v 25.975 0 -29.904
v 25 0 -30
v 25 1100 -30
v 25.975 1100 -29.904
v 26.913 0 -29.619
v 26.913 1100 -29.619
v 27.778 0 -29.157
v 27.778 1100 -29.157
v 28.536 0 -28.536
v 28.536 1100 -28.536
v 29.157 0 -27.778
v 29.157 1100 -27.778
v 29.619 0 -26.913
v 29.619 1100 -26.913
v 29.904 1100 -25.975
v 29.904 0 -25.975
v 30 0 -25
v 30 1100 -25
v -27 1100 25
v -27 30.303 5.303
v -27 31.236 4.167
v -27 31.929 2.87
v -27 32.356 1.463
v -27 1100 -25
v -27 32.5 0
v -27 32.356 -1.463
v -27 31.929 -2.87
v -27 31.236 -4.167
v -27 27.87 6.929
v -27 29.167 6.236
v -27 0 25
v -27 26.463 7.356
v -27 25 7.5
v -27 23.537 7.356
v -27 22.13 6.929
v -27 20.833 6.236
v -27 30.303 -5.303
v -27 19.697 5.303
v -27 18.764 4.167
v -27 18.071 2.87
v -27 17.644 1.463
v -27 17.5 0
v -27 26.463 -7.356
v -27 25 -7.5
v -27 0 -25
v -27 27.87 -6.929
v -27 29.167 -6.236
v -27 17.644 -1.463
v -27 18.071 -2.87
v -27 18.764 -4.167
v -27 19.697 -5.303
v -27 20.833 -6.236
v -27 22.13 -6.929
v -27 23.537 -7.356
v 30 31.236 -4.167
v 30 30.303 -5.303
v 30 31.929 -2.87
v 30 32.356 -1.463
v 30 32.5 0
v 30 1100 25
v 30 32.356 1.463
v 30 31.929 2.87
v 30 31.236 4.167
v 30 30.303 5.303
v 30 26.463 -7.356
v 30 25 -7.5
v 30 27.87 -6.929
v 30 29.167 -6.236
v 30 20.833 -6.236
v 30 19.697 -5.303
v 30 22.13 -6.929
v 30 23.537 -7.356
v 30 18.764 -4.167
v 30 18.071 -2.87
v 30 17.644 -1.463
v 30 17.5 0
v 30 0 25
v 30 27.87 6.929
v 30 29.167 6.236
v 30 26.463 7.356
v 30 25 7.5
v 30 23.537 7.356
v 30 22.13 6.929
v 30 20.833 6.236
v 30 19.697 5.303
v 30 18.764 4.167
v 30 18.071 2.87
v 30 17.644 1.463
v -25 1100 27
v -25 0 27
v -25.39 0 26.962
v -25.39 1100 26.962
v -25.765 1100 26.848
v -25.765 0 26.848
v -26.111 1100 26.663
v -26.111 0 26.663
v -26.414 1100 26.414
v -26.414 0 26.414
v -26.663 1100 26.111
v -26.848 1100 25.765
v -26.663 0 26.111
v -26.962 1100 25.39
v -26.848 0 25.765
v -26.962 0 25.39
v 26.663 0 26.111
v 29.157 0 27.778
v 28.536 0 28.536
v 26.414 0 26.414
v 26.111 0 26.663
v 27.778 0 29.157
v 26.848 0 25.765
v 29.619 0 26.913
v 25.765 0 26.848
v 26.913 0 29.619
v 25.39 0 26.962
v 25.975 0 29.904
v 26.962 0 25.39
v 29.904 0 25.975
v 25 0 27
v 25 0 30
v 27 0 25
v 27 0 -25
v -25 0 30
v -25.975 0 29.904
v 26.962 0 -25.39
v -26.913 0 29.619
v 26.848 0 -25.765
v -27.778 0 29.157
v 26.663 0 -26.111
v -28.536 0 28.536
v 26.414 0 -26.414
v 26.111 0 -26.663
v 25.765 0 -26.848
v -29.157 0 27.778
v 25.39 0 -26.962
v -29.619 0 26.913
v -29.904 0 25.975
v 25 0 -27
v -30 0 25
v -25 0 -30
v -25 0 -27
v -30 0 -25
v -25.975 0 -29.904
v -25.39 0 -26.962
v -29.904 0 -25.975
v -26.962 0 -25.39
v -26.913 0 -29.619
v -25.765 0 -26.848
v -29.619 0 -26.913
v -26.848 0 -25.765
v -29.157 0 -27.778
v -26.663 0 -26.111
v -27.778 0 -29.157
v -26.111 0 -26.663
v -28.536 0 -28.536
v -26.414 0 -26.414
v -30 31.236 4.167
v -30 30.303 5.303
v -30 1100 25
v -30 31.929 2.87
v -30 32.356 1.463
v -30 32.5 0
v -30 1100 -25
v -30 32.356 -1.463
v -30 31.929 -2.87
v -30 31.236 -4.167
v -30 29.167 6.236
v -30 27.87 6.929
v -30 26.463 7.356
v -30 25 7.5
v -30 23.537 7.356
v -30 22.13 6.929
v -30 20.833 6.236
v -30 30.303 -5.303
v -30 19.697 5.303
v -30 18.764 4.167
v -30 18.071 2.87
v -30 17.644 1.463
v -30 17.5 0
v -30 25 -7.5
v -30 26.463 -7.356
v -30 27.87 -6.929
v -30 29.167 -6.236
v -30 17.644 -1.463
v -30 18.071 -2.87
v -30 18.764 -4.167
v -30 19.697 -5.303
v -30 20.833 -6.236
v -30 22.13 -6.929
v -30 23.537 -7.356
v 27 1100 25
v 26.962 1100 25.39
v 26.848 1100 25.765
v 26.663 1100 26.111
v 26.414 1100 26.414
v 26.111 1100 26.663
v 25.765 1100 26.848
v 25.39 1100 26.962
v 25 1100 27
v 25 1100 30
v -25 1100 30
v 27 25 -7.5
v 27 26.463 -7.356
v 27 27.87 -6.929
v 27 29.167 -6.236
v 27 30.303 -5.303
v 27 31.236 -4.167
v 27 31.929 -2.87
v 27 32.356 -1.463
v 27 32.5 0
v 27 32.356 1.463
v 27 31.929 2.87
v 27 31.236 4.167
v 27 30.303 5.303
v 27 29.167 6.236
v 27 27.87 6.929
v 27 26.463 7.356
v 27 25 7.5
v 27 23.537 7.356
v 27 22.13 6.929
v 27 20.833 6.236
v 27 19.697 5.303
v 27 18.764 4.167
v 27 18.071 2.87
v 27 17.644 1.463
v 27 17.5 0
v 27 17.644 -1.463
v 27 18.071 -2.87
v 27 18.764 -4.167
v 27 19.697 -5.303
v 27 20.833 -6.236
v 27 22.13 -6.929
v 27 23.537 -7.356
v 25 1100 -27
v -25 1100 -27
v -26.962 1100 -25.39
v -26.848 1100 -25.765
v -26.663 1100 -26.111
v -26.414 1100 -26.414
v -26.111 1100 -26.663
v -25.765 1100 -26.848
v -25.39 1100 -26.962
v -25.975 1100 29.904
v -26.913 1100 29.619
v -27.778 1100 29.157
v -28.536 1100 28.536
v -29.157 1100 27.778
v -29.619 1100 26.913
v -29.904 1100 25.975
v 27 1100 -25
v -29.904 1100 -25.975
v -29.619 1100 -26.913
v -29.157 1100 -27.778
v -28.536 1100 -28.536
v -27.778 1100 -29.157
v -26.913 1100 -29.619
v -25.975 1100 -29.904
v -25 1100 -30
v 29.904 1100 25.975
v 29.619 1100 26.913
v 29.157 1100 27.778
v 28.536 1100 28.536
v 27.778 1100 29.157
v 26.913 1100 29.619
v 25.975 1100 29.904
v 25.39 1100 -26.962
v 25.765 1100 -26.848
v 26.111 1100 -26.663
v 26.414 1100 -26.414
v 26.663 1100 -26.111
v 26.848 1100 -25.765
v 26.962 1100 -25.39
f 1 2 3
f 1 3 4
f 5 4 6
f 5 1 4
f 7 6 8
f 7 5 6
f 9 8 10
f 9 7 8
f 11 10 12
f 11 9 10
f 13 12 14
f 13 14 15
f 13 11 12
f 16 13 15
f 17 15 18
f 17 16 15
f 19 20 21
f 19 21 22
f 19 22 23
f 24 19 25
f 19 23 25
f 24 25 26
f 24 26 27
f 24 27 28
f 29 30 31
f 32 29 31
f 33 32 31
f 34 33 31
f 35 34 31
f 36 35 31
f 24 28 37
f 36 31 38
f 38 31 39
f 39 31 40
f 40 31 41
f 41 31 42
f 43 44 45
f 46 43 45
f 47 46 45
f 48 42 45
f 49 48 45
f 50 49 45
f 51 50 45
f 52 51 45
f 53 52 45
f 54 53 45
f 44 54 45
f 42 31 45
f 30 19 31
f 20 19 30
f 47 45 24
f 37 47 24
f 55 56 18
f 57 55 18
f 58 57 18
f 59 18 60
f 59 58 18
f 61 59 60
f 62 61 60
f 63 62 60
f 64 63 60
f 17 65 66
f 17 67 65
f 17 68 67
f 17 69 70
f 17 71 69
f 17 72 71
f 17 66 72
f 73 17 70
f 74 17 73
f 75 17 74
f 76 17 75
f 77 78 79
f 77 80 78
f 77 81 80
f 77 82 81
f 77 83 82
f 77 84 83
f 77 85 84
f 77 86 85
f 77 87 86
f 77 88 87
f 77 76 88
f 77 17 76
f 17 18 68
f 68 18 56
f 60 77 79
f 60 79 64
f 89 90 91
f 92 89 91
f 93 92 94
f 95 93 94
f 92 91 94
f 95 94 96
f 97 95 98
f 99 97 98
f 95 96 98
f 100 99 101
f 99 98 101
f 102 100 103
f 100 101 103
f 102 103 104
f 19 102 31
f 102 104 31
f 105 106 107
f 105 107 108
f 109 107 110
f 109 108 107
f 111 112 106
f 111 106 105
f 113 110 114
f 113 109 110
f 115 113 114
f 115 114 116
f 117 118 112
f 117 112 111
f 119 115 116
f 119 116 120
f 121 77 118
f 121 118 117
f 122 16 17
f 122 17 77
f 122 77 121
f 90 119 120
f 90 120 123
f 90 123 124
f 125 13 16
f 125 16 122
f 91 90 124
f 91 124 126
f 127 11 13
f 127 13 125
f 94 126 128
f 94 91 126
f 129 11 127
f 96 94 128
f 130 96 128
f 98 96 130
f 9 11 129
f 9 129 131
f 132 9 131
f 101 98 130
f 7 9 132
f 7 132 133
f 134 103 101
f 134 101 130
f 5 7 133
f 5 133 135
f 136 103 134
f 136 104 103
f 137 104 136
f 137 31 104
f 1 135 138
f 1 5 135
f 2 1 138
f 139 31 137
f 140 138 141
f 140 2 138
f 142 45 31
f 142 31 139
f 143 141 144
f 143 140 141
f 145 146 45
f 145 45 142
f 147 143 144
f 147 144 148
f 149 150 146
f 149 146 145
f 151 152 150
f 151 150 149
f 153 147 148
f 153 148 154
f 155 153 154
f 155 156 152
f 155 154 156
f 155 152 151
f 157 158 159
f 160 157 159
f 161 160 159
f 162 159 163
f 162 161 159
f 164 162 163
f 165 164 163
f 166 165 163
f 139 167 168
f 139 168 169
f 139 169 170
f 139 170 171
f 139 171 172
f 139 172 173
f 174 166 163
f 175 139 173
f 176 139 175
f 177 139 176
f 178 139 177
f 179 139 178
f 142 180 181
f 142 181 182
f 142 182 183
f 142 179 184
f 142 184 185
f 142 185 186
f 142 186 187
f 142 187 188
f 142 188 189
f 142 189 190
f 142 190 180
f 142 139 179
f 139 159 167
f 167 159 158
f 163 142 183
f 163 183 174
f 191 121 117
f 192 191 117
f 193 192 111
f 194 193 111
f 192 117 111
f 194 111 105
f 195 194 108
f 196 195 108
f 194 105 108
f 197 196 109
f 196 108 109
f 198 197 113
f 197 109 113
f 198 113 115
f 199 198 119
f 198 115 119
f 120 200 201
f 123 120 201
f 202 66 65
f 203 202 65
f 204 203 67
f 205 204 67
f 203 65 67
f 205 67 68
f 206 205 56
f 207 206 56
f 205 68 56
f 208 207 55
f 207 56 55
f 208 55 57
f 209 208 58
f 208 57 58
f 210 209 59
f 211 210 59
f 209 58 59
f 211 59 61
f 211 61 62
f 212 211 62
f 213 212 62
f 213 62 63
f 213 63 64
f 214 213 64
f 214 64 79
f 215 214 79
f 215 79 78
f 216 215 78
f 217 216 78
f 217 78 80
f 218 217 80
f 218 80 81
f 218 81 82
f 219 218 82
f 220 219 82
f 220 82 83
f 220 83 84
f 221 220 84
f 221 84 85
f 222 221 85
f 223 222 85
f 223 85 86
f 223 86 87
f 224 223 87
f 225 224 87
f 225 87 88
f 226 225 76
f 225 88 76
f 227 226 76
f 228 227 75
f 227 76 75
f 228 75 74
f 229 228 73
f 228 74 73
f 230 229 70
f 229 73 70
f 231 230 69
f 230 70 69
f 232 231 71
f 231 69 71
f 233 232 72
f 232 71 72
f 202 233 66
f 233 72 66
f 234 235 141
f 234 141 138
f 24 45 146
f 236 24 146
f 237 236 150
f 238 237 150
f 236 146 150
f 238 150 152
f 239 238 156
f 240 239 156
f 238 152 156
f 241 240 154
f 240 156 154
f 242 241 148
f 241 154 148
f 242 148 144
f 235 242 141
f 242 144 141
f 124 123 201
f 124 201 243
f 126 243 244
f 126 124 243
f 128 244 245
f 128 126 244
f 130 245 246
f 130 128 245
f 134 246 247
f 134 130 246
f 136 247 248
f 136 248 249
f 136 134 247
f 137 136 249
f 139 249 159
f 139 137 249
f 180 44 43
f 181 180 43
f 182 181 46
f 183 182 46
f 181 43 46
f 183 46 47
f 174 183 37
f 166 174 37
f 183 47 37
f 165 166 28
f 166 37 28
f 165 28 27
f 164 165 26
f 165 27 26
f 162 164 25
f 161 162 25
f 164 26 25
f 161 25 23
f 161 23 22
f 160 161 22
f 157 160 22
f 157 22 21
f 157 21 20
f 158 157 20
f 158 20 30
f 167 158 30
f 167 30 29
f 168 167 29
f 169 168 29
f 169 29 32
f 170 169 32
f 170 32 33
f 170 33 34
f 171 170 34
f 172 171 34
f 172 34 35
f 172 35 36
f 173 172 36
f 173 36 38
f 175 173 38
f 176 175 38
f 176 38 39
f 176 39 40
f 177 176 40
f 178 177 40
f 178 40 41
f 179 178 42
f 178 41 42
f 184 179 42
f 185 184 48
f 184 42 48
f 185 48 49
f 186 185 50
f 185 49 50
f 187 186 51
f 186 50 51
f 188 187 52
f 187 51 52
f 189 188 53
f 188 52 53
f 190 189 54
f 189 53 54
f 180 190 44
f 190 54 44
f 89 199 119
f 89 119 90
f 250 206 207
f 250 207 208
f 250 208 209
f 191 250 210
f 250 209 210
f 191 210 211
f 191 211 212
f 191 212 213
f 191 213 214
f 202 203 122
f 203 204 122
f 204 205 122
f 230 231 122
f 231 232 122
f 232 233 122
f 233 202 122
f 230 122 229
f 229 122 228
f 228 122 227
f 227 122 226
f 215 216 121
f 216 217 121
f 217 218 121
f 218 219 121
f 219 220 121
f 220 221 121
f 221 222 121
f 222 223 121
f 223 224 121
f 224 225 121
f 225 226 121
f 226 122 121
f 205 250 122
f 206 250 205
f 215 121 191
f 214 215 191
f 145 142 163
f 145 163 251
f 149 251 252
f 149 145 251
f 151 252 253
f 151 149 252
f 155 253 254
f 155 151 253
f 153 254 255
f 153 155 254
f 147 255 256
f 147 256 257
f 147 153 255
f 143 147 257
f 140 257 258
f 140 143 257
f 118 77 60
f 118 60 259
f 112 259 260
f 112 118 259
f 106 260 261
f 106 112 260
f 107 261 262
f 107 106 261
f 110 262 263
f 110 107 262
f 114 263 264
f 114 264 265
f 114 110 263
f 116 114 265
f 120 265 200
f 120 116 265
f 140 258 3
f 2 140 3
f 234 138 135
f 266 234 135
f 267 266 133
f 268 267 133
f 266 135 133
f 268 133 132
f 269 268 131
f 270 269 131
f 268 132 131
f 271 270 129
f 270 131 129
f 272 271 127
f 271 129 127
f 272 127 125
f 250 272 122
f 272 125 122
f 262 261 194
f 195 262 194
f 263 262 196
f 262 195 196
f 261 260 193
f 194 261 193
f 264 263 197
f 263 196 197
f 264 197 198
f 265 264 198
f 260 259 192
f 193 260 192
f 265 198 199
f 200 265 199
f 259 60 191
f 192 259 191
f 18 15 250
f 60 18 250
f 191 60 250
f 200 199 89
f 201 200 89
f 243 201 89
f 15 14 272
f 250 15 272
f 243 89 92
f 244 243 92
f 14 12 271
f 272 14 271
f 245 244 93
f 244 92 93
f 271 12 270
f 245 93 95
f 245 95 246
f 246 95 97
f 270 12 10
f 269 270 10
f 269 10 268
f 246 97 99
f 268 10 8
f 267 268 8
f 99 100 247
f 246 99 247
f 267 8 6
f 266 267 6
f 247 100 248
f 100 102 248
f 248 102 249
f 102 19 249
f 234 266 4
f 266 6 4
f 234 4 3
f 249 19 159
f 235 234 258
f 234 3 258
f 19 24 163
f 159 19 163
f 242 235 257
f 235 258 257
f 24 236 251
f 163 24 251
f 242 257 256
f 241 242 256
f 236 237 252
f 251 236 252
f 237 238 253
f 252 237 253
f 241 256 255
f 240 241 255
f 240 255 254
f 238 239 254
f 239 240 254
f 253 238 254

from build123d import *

# Parameters (mm, degrees)
EXTRUDE_1_DEPTH     = 1100
SKETCH_2_R          = 7.5
CUT_EXTRUDE_1_DEPTH = 61


with BuildPart() as part:
    # Эскиз1 → Вытянуть-Тонкостенный1 (new body)
    with BuildSketch(Plane(origin=(0, 0, 0), x_dir=(1, 0, 0), z_dir=(0, 1, 0))):
        with BuildLine():
            Line((-25, 30), (25, 30))
            ThreePointArc((25, 30), (28.535533906, 28.535533906), (30, 25))
            Line((30, 25), (30, -25))
            ThreePointArc((30, -25), (28.535533906, -28.535533906), (25, -30))
            Line((25, -30), (-25, -30))
            ThreePointArc((-25, -30), (-28.535533906, -28.535533906), (-30, -25))
            Line((-30, -25), (-30, 25))
            ThreePointArc((-30, 25), (-28.535533906, 28.535533906), (-25, 30))
        make_face()
        with BuildLine():
            Line((-25, 27), (25, 27))
            ThreePointArc((25, 27), (26.414213562, 26.414213562), (27, 25))
            Line((27, 25), (27, -25))
            ThreePointArc((27, -25), (26.414213562, -26.414213562), (25, -27))
            Line((25, -27), (-25, -27))
            ThreePointArc((-25, -27), (-26.414213562, -26.414213562), (-27, -25))
            Line((-27, -25), (-27, 25))
            ThreePointArc((-27, 25), (-26.414213562, 26.414213562), (-25, 27))
        make_face(mode=Mode.SUBTRACT)
    extrude(amount=EXTRUDE_1_DEPTH)

    # Эскиз2 → Вырез-Вытянуть1 (cut, through all)
    with BuildSketch(Plane(origin=(30, 0, 0), x_dir=(0, 0, -1), z_dir=(1, 0, 0))):
        with Locations((0, 25)):
            Circle(SKETCH_2_R)
    extrude(amount=-CUT_EXTRUDE_1_DEPTH, mode=Mode.SUBTRACT)


solid = part.part
